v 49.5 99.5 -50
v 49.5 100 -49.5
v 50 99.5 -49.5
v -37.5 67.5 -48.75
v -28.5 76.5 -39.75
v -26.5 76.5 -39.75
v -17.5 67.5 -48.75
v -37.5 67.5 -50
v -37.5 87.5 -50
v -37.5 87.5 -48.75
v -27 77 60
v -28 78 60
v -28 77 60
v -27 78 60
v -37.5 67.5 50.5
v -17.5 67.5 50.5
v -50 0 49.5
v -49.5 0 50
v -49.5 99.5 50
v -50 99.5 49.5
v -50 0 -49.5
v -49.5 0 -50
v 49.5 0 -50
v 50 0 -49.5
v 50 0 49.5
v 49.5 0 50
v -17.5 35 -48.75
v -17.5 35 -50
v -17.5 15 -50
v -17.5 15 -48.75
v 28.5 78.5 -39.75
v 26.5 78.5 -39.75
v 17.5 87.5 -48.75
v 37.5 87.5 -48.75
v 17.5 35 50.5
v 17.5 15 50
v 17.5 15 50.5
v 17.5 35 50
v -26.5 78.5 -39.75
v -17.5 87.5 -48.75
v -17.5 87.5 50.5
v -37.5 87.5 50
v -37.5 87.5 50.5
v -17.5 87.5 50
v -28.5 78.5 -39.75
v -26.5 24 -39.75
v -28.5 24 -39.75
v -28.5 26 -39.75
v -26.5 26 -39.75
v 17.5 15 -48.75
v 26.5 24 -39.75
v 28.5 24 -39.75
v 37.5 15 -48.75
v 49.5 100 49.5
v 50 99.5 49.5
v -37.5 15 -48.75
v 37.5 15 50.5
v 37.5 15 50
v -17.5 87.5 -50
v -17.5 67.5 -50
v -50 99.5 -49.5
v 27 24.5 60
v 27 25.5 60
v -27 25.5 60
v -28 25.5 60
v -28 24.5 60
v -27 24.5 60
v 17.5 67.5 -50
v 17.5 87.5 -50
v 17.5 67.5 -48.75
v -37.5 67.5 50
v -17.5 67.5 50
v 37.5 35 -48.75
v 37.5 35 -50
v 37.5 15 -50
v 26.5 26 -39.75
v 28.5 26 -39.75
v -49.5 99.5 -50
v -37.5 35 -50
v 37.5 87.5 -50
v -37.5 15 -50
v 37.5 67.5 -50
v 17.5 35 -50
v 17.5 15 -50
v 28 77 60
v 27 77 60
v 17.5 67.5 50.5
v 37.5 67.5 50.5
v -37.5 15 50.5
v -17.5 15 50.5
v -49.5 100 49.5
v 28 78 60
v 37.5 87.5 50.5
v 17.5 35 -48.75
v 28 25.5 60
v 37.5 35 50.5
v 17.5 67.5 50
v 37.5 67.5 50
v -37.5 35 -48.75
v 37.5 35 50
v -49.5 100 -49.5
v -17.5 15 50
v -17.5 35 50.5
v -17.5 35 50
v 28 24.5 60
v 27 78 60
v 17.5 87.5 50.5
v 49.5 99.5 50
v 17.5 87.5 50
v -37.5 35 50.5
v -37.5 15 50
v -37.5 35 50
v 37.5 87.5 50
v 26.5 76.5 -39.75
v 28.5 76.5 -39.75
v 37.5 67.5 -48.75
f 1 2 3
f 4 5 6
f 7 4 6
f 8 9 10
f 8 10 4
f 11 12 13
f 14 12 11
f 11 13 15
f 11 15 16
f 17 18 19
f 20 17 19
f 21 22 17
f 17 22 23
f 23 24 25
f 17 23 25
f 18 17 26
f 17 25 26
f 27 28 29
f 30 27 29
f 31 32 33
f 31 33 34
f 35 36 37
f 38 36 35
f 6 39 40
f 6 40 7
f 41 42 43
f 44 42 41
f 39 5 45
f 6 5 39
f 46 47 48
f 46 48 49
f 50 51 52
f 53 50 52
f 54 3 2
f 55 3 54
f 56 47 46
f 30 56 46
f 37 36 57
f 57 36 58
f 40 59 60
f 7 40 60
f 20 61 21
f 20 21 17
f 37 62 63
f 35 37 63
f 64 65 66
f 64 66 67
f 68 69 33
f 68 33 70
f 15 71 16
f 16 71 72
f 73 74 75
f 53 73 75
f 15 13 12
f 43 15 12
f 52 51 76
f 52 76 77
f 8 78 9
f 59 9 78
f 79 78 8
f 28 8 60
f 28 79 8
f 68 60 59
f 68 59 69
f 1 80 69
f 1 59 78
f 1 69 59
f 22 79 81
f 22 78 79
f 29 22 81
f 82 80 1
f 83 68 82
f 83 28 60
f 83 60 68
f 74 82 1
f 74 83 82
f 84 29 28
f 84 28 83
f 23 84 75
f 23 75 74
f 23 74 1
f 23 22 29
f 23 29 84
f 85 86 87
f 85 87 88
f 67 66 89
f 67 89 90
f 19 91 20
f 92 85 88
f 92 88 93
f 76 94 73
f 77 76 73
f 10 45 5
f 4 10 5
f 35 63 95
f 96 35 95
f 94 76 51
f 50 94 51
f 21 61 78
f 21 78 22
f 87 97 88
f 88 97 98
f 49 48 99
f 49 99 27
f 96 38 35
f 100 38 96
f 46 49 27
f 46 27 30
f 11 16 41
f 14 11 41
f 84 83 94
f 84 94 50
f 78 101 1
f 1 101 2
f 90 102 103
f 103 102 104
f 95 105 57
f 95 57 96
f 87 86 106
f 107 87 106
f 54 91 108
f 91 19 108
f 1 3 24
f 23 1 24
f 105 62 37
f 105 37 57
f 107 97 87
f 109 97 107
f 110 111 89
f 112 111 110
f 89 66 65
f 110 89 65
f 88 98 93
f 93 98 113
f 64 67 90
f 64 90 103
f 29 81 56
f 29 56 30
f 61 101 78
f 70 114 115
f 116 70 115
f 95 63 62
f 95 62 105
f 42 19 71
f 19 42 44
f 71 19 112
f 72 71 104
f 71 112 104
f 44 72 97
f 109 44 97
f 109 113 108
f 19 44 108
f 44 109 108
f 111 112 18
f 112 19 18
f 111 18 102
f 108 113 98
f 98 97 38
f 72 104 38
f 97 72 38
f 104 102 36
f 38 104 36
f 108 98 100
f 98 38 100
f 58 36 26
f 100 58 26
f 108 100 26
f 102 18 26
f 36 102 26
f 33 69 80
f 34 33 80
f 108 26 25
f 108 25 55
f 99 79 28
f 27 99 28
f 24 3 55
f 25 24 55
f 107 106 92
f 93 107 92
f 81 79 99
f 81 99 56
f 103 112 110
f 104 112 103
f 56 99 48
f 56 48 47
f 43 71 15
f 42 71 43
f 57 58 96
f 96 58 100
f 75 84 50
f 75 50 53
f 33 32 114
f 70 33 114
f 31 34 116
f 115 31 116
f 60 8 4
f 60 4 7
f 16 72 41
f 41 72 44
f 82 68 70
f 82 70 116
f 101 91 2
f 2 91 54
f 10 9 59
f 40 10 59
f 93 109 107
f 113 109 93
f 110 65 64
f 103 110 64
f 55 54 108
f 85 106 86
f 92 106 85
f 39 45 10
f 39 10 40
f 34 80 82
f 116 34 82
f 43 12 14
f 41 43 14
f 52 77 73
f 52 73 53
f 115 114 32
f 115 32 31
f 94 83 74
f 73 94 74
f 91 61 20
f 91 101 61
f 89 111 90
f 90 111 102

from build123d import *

# Parameters (mm, degrees)
F0_W      = 100
F0_H      = 100
F1_DEPTH  = 100
F2_W      = 20
F2_H      = 20
F3_DEPTH  = 10
F4_SIZE   = 9.5
F5_W      = 20
F5_H      = 20
F6_DEPTH  = 10.25
F7_SIZE   = 9
F8_SIZE   = 0.5
F10_DEPTH = 100


with BuildPart() as f1:
    # F0 (on Front) → F1 (new body, symmetric)
    with BuildSketch(Plane.XZ):
        Rectangle(F0_W, F0_H)
    extrude(amount=F1_DEPTH, both=True)

    # F2 (on face) → F3 (join)
    with BuildSketch(Plane.XY.offset(50)):
        with Locations((-27.5, 77.5)):
            Rectangle(F2_W, F2_H)
        with Locations((27.5, 77.5)):
            Rectangle(F2_W, F2_H)
        with Locations((-27.5, 25)):
            Rectangle(F2_W, F2_H)
        with Locations((-27.5, -25)):
            Rectangle(F2_W, F2_H)
        with Locations((-27.5, -77.5)):
            Rectangle(F2_W, F2_H)
        with Locations((27.5, -77.5)):
            Rectangle(F2_W, F2_H)
        with Locations((27.5, -25)):
            Rectangle(F2_W, F2_H)
        with Locations((27.5, 25)):
            Rectangle(F2_W, F2_H)
    extrude(amount=F3_DEPTH)

    # F4
    f4_edges = [f1.edges().sort_by_distance(p)[0] for p in [
        (27.5, -67.5, 60),
        (17.5, -77.5, 60),
        (27.5, -87.5, 60),
        (37.5, -77.5, 60),
        (27.5, -15, 60),
        (17.5, -25, 60),
        (27.5, -35, 60),
        (37.5, -25, 60),
        (-27.5, -67.5, 60),
        (-37.5, -77.5, 60),
        (-27.5, -87.5, 60),
        (-17.5, -77.5, 60),
        (-27.5, -15, 60),
        (-37.5, -25, 60),
        (-27.5, -35, 60),
        (-17.5, -25, 60),
        (-27.5, 35, 60),
        (-37.5, 25, 60),
        (-27.5, 15, 60),
        (-17.5, 25, 60),
        (-27.5, 87.5, 60),
        (-37.5, 77.5, 60),
        (-27.5, 67.5, 60),
        (-17.5, 77.5, 60),
        (27.5, 87.5, 60),
        (17.5, 77.5, 60),
        (27.5, 67.5, 60),
        (37.5, 77.5, 60),
        (17.5, 25, 60),
        (27.5, 15, 60),
        (37.5, 25, 60),
        (27.5, 35, 60),
    ]]
    chamfer(f4_edges, length=F4_SIZE)

    # F5 (on face) → F6 (cut)
    with BuildSketch(Plane(origin=(0, 0, -50), x_dir=(1, 0, 0), z_dir=(0, 0, -1))):
        with Locations((-27.5, 77.5)):
            Rectangle(F5_W, F5_H)
        with Locations((27.5, 77.5)):
            Rectangle(F5_W, F5_H)
        with Locations((27.5, 25)):
            Rectangle(F5_W, F5_H)
        with Locations((-27.5, 25)):
            Rectangle(F5_W, F5_H)
        with Locations((-27.5, -25)):
            Rectangle(F5_W, F5_H)
        with Locations((27.5, -25)):
            Rectangle(F5_W, F5_H)
        with Locations((27.5, -77.5)):
            Rectangle(F5_W, F5_H)
        with Locations((-27.5, -77.5)):
            Rectangle(F5_W, F5_H)
    extrude(amount=-F6_DEPTH, mode=Mode.SUBTRACT)

    # F7
    f7_edges = [f1.edges().sort_by_distance(p)[0] for p in [
        (27.5, -87.5, -39.75),
        (17.5, -77.5, -39.75),
        (27.5, -67.5, -39.75),
        (37.5, -77.5, -39.75),
        (-27.5, -87.5, -39.75),
        (-37.5, -77.5, -39.75),
        (-27.5, -67.5, -39.75),
        (-17.5, -77.5, -39.75),
        (-27.5, -35, -39.75),
        (-37.5, -25, -39.75),
        (-27.5, -15, -39.75),
        (-17.5, -25, -39.75),
        (17.5, -25, -39.75),
        (27.5, -15, -39.75),
        (37.5, -25, -39.75),
        (27.5, -35, -39.75),
        (27.5, 15, -39.75),
        (17.5, 25, -39.75),
        (27.5, 35, -39.75),
        (37.5, 25, -39.75),
        (-27.5, 15, -39.75),
        (-37.5, 25, -39.75),
        (-27.5, 35, -39.75),
        (-17.5, 25, -39.75),
        (-27.5, 67.5, -39.75),
        (-37.5, 77.5, -39.75),
        (-27.5, 87.5, -39.75),
        (-17.5, 77.5, -39.75),
        (27.5, 67.5, -39.75),
        (17.5, 77.5, -39.75),
        (27.5, 87.5, -39.75),
        (37.5, 77.5, -39.75),
    ]]
    chamfer(f7_edges, length=F7_SIZE)

    # F8
    f8_edges = [f1.edges().sort_by_distance(p)[0] for p in [
        (0, -100, 50),
        (-50, -100, 0),
        (0, -100, -50),
        (50, -100, 0),
        (0, 100, 50),
        (-50, 100, 0),
        (0, 100, -50),
        (50, 100, 0),
        (50, 0, 50),
        (50, 0, -50),
        (-50, 0, 50),
        (-50, 0, -50),
    ]]
    chamfer(f8_edges, length=F8_SIZE)

    # F9 (on face) → F10 (cut)
    with BuildSketch(Plane.YZ.offset(50)):
        Polygon((0, -62.8767311573), (0, 0), (0, 74.2203742266), (-106.3256561756, 74.2203742266), (-106.3256561756, -62.8767311573), align=None)
    extrude(amount=-F10_DEPTH, mode=Mode.SUBTRACT)


solid = f1.part
